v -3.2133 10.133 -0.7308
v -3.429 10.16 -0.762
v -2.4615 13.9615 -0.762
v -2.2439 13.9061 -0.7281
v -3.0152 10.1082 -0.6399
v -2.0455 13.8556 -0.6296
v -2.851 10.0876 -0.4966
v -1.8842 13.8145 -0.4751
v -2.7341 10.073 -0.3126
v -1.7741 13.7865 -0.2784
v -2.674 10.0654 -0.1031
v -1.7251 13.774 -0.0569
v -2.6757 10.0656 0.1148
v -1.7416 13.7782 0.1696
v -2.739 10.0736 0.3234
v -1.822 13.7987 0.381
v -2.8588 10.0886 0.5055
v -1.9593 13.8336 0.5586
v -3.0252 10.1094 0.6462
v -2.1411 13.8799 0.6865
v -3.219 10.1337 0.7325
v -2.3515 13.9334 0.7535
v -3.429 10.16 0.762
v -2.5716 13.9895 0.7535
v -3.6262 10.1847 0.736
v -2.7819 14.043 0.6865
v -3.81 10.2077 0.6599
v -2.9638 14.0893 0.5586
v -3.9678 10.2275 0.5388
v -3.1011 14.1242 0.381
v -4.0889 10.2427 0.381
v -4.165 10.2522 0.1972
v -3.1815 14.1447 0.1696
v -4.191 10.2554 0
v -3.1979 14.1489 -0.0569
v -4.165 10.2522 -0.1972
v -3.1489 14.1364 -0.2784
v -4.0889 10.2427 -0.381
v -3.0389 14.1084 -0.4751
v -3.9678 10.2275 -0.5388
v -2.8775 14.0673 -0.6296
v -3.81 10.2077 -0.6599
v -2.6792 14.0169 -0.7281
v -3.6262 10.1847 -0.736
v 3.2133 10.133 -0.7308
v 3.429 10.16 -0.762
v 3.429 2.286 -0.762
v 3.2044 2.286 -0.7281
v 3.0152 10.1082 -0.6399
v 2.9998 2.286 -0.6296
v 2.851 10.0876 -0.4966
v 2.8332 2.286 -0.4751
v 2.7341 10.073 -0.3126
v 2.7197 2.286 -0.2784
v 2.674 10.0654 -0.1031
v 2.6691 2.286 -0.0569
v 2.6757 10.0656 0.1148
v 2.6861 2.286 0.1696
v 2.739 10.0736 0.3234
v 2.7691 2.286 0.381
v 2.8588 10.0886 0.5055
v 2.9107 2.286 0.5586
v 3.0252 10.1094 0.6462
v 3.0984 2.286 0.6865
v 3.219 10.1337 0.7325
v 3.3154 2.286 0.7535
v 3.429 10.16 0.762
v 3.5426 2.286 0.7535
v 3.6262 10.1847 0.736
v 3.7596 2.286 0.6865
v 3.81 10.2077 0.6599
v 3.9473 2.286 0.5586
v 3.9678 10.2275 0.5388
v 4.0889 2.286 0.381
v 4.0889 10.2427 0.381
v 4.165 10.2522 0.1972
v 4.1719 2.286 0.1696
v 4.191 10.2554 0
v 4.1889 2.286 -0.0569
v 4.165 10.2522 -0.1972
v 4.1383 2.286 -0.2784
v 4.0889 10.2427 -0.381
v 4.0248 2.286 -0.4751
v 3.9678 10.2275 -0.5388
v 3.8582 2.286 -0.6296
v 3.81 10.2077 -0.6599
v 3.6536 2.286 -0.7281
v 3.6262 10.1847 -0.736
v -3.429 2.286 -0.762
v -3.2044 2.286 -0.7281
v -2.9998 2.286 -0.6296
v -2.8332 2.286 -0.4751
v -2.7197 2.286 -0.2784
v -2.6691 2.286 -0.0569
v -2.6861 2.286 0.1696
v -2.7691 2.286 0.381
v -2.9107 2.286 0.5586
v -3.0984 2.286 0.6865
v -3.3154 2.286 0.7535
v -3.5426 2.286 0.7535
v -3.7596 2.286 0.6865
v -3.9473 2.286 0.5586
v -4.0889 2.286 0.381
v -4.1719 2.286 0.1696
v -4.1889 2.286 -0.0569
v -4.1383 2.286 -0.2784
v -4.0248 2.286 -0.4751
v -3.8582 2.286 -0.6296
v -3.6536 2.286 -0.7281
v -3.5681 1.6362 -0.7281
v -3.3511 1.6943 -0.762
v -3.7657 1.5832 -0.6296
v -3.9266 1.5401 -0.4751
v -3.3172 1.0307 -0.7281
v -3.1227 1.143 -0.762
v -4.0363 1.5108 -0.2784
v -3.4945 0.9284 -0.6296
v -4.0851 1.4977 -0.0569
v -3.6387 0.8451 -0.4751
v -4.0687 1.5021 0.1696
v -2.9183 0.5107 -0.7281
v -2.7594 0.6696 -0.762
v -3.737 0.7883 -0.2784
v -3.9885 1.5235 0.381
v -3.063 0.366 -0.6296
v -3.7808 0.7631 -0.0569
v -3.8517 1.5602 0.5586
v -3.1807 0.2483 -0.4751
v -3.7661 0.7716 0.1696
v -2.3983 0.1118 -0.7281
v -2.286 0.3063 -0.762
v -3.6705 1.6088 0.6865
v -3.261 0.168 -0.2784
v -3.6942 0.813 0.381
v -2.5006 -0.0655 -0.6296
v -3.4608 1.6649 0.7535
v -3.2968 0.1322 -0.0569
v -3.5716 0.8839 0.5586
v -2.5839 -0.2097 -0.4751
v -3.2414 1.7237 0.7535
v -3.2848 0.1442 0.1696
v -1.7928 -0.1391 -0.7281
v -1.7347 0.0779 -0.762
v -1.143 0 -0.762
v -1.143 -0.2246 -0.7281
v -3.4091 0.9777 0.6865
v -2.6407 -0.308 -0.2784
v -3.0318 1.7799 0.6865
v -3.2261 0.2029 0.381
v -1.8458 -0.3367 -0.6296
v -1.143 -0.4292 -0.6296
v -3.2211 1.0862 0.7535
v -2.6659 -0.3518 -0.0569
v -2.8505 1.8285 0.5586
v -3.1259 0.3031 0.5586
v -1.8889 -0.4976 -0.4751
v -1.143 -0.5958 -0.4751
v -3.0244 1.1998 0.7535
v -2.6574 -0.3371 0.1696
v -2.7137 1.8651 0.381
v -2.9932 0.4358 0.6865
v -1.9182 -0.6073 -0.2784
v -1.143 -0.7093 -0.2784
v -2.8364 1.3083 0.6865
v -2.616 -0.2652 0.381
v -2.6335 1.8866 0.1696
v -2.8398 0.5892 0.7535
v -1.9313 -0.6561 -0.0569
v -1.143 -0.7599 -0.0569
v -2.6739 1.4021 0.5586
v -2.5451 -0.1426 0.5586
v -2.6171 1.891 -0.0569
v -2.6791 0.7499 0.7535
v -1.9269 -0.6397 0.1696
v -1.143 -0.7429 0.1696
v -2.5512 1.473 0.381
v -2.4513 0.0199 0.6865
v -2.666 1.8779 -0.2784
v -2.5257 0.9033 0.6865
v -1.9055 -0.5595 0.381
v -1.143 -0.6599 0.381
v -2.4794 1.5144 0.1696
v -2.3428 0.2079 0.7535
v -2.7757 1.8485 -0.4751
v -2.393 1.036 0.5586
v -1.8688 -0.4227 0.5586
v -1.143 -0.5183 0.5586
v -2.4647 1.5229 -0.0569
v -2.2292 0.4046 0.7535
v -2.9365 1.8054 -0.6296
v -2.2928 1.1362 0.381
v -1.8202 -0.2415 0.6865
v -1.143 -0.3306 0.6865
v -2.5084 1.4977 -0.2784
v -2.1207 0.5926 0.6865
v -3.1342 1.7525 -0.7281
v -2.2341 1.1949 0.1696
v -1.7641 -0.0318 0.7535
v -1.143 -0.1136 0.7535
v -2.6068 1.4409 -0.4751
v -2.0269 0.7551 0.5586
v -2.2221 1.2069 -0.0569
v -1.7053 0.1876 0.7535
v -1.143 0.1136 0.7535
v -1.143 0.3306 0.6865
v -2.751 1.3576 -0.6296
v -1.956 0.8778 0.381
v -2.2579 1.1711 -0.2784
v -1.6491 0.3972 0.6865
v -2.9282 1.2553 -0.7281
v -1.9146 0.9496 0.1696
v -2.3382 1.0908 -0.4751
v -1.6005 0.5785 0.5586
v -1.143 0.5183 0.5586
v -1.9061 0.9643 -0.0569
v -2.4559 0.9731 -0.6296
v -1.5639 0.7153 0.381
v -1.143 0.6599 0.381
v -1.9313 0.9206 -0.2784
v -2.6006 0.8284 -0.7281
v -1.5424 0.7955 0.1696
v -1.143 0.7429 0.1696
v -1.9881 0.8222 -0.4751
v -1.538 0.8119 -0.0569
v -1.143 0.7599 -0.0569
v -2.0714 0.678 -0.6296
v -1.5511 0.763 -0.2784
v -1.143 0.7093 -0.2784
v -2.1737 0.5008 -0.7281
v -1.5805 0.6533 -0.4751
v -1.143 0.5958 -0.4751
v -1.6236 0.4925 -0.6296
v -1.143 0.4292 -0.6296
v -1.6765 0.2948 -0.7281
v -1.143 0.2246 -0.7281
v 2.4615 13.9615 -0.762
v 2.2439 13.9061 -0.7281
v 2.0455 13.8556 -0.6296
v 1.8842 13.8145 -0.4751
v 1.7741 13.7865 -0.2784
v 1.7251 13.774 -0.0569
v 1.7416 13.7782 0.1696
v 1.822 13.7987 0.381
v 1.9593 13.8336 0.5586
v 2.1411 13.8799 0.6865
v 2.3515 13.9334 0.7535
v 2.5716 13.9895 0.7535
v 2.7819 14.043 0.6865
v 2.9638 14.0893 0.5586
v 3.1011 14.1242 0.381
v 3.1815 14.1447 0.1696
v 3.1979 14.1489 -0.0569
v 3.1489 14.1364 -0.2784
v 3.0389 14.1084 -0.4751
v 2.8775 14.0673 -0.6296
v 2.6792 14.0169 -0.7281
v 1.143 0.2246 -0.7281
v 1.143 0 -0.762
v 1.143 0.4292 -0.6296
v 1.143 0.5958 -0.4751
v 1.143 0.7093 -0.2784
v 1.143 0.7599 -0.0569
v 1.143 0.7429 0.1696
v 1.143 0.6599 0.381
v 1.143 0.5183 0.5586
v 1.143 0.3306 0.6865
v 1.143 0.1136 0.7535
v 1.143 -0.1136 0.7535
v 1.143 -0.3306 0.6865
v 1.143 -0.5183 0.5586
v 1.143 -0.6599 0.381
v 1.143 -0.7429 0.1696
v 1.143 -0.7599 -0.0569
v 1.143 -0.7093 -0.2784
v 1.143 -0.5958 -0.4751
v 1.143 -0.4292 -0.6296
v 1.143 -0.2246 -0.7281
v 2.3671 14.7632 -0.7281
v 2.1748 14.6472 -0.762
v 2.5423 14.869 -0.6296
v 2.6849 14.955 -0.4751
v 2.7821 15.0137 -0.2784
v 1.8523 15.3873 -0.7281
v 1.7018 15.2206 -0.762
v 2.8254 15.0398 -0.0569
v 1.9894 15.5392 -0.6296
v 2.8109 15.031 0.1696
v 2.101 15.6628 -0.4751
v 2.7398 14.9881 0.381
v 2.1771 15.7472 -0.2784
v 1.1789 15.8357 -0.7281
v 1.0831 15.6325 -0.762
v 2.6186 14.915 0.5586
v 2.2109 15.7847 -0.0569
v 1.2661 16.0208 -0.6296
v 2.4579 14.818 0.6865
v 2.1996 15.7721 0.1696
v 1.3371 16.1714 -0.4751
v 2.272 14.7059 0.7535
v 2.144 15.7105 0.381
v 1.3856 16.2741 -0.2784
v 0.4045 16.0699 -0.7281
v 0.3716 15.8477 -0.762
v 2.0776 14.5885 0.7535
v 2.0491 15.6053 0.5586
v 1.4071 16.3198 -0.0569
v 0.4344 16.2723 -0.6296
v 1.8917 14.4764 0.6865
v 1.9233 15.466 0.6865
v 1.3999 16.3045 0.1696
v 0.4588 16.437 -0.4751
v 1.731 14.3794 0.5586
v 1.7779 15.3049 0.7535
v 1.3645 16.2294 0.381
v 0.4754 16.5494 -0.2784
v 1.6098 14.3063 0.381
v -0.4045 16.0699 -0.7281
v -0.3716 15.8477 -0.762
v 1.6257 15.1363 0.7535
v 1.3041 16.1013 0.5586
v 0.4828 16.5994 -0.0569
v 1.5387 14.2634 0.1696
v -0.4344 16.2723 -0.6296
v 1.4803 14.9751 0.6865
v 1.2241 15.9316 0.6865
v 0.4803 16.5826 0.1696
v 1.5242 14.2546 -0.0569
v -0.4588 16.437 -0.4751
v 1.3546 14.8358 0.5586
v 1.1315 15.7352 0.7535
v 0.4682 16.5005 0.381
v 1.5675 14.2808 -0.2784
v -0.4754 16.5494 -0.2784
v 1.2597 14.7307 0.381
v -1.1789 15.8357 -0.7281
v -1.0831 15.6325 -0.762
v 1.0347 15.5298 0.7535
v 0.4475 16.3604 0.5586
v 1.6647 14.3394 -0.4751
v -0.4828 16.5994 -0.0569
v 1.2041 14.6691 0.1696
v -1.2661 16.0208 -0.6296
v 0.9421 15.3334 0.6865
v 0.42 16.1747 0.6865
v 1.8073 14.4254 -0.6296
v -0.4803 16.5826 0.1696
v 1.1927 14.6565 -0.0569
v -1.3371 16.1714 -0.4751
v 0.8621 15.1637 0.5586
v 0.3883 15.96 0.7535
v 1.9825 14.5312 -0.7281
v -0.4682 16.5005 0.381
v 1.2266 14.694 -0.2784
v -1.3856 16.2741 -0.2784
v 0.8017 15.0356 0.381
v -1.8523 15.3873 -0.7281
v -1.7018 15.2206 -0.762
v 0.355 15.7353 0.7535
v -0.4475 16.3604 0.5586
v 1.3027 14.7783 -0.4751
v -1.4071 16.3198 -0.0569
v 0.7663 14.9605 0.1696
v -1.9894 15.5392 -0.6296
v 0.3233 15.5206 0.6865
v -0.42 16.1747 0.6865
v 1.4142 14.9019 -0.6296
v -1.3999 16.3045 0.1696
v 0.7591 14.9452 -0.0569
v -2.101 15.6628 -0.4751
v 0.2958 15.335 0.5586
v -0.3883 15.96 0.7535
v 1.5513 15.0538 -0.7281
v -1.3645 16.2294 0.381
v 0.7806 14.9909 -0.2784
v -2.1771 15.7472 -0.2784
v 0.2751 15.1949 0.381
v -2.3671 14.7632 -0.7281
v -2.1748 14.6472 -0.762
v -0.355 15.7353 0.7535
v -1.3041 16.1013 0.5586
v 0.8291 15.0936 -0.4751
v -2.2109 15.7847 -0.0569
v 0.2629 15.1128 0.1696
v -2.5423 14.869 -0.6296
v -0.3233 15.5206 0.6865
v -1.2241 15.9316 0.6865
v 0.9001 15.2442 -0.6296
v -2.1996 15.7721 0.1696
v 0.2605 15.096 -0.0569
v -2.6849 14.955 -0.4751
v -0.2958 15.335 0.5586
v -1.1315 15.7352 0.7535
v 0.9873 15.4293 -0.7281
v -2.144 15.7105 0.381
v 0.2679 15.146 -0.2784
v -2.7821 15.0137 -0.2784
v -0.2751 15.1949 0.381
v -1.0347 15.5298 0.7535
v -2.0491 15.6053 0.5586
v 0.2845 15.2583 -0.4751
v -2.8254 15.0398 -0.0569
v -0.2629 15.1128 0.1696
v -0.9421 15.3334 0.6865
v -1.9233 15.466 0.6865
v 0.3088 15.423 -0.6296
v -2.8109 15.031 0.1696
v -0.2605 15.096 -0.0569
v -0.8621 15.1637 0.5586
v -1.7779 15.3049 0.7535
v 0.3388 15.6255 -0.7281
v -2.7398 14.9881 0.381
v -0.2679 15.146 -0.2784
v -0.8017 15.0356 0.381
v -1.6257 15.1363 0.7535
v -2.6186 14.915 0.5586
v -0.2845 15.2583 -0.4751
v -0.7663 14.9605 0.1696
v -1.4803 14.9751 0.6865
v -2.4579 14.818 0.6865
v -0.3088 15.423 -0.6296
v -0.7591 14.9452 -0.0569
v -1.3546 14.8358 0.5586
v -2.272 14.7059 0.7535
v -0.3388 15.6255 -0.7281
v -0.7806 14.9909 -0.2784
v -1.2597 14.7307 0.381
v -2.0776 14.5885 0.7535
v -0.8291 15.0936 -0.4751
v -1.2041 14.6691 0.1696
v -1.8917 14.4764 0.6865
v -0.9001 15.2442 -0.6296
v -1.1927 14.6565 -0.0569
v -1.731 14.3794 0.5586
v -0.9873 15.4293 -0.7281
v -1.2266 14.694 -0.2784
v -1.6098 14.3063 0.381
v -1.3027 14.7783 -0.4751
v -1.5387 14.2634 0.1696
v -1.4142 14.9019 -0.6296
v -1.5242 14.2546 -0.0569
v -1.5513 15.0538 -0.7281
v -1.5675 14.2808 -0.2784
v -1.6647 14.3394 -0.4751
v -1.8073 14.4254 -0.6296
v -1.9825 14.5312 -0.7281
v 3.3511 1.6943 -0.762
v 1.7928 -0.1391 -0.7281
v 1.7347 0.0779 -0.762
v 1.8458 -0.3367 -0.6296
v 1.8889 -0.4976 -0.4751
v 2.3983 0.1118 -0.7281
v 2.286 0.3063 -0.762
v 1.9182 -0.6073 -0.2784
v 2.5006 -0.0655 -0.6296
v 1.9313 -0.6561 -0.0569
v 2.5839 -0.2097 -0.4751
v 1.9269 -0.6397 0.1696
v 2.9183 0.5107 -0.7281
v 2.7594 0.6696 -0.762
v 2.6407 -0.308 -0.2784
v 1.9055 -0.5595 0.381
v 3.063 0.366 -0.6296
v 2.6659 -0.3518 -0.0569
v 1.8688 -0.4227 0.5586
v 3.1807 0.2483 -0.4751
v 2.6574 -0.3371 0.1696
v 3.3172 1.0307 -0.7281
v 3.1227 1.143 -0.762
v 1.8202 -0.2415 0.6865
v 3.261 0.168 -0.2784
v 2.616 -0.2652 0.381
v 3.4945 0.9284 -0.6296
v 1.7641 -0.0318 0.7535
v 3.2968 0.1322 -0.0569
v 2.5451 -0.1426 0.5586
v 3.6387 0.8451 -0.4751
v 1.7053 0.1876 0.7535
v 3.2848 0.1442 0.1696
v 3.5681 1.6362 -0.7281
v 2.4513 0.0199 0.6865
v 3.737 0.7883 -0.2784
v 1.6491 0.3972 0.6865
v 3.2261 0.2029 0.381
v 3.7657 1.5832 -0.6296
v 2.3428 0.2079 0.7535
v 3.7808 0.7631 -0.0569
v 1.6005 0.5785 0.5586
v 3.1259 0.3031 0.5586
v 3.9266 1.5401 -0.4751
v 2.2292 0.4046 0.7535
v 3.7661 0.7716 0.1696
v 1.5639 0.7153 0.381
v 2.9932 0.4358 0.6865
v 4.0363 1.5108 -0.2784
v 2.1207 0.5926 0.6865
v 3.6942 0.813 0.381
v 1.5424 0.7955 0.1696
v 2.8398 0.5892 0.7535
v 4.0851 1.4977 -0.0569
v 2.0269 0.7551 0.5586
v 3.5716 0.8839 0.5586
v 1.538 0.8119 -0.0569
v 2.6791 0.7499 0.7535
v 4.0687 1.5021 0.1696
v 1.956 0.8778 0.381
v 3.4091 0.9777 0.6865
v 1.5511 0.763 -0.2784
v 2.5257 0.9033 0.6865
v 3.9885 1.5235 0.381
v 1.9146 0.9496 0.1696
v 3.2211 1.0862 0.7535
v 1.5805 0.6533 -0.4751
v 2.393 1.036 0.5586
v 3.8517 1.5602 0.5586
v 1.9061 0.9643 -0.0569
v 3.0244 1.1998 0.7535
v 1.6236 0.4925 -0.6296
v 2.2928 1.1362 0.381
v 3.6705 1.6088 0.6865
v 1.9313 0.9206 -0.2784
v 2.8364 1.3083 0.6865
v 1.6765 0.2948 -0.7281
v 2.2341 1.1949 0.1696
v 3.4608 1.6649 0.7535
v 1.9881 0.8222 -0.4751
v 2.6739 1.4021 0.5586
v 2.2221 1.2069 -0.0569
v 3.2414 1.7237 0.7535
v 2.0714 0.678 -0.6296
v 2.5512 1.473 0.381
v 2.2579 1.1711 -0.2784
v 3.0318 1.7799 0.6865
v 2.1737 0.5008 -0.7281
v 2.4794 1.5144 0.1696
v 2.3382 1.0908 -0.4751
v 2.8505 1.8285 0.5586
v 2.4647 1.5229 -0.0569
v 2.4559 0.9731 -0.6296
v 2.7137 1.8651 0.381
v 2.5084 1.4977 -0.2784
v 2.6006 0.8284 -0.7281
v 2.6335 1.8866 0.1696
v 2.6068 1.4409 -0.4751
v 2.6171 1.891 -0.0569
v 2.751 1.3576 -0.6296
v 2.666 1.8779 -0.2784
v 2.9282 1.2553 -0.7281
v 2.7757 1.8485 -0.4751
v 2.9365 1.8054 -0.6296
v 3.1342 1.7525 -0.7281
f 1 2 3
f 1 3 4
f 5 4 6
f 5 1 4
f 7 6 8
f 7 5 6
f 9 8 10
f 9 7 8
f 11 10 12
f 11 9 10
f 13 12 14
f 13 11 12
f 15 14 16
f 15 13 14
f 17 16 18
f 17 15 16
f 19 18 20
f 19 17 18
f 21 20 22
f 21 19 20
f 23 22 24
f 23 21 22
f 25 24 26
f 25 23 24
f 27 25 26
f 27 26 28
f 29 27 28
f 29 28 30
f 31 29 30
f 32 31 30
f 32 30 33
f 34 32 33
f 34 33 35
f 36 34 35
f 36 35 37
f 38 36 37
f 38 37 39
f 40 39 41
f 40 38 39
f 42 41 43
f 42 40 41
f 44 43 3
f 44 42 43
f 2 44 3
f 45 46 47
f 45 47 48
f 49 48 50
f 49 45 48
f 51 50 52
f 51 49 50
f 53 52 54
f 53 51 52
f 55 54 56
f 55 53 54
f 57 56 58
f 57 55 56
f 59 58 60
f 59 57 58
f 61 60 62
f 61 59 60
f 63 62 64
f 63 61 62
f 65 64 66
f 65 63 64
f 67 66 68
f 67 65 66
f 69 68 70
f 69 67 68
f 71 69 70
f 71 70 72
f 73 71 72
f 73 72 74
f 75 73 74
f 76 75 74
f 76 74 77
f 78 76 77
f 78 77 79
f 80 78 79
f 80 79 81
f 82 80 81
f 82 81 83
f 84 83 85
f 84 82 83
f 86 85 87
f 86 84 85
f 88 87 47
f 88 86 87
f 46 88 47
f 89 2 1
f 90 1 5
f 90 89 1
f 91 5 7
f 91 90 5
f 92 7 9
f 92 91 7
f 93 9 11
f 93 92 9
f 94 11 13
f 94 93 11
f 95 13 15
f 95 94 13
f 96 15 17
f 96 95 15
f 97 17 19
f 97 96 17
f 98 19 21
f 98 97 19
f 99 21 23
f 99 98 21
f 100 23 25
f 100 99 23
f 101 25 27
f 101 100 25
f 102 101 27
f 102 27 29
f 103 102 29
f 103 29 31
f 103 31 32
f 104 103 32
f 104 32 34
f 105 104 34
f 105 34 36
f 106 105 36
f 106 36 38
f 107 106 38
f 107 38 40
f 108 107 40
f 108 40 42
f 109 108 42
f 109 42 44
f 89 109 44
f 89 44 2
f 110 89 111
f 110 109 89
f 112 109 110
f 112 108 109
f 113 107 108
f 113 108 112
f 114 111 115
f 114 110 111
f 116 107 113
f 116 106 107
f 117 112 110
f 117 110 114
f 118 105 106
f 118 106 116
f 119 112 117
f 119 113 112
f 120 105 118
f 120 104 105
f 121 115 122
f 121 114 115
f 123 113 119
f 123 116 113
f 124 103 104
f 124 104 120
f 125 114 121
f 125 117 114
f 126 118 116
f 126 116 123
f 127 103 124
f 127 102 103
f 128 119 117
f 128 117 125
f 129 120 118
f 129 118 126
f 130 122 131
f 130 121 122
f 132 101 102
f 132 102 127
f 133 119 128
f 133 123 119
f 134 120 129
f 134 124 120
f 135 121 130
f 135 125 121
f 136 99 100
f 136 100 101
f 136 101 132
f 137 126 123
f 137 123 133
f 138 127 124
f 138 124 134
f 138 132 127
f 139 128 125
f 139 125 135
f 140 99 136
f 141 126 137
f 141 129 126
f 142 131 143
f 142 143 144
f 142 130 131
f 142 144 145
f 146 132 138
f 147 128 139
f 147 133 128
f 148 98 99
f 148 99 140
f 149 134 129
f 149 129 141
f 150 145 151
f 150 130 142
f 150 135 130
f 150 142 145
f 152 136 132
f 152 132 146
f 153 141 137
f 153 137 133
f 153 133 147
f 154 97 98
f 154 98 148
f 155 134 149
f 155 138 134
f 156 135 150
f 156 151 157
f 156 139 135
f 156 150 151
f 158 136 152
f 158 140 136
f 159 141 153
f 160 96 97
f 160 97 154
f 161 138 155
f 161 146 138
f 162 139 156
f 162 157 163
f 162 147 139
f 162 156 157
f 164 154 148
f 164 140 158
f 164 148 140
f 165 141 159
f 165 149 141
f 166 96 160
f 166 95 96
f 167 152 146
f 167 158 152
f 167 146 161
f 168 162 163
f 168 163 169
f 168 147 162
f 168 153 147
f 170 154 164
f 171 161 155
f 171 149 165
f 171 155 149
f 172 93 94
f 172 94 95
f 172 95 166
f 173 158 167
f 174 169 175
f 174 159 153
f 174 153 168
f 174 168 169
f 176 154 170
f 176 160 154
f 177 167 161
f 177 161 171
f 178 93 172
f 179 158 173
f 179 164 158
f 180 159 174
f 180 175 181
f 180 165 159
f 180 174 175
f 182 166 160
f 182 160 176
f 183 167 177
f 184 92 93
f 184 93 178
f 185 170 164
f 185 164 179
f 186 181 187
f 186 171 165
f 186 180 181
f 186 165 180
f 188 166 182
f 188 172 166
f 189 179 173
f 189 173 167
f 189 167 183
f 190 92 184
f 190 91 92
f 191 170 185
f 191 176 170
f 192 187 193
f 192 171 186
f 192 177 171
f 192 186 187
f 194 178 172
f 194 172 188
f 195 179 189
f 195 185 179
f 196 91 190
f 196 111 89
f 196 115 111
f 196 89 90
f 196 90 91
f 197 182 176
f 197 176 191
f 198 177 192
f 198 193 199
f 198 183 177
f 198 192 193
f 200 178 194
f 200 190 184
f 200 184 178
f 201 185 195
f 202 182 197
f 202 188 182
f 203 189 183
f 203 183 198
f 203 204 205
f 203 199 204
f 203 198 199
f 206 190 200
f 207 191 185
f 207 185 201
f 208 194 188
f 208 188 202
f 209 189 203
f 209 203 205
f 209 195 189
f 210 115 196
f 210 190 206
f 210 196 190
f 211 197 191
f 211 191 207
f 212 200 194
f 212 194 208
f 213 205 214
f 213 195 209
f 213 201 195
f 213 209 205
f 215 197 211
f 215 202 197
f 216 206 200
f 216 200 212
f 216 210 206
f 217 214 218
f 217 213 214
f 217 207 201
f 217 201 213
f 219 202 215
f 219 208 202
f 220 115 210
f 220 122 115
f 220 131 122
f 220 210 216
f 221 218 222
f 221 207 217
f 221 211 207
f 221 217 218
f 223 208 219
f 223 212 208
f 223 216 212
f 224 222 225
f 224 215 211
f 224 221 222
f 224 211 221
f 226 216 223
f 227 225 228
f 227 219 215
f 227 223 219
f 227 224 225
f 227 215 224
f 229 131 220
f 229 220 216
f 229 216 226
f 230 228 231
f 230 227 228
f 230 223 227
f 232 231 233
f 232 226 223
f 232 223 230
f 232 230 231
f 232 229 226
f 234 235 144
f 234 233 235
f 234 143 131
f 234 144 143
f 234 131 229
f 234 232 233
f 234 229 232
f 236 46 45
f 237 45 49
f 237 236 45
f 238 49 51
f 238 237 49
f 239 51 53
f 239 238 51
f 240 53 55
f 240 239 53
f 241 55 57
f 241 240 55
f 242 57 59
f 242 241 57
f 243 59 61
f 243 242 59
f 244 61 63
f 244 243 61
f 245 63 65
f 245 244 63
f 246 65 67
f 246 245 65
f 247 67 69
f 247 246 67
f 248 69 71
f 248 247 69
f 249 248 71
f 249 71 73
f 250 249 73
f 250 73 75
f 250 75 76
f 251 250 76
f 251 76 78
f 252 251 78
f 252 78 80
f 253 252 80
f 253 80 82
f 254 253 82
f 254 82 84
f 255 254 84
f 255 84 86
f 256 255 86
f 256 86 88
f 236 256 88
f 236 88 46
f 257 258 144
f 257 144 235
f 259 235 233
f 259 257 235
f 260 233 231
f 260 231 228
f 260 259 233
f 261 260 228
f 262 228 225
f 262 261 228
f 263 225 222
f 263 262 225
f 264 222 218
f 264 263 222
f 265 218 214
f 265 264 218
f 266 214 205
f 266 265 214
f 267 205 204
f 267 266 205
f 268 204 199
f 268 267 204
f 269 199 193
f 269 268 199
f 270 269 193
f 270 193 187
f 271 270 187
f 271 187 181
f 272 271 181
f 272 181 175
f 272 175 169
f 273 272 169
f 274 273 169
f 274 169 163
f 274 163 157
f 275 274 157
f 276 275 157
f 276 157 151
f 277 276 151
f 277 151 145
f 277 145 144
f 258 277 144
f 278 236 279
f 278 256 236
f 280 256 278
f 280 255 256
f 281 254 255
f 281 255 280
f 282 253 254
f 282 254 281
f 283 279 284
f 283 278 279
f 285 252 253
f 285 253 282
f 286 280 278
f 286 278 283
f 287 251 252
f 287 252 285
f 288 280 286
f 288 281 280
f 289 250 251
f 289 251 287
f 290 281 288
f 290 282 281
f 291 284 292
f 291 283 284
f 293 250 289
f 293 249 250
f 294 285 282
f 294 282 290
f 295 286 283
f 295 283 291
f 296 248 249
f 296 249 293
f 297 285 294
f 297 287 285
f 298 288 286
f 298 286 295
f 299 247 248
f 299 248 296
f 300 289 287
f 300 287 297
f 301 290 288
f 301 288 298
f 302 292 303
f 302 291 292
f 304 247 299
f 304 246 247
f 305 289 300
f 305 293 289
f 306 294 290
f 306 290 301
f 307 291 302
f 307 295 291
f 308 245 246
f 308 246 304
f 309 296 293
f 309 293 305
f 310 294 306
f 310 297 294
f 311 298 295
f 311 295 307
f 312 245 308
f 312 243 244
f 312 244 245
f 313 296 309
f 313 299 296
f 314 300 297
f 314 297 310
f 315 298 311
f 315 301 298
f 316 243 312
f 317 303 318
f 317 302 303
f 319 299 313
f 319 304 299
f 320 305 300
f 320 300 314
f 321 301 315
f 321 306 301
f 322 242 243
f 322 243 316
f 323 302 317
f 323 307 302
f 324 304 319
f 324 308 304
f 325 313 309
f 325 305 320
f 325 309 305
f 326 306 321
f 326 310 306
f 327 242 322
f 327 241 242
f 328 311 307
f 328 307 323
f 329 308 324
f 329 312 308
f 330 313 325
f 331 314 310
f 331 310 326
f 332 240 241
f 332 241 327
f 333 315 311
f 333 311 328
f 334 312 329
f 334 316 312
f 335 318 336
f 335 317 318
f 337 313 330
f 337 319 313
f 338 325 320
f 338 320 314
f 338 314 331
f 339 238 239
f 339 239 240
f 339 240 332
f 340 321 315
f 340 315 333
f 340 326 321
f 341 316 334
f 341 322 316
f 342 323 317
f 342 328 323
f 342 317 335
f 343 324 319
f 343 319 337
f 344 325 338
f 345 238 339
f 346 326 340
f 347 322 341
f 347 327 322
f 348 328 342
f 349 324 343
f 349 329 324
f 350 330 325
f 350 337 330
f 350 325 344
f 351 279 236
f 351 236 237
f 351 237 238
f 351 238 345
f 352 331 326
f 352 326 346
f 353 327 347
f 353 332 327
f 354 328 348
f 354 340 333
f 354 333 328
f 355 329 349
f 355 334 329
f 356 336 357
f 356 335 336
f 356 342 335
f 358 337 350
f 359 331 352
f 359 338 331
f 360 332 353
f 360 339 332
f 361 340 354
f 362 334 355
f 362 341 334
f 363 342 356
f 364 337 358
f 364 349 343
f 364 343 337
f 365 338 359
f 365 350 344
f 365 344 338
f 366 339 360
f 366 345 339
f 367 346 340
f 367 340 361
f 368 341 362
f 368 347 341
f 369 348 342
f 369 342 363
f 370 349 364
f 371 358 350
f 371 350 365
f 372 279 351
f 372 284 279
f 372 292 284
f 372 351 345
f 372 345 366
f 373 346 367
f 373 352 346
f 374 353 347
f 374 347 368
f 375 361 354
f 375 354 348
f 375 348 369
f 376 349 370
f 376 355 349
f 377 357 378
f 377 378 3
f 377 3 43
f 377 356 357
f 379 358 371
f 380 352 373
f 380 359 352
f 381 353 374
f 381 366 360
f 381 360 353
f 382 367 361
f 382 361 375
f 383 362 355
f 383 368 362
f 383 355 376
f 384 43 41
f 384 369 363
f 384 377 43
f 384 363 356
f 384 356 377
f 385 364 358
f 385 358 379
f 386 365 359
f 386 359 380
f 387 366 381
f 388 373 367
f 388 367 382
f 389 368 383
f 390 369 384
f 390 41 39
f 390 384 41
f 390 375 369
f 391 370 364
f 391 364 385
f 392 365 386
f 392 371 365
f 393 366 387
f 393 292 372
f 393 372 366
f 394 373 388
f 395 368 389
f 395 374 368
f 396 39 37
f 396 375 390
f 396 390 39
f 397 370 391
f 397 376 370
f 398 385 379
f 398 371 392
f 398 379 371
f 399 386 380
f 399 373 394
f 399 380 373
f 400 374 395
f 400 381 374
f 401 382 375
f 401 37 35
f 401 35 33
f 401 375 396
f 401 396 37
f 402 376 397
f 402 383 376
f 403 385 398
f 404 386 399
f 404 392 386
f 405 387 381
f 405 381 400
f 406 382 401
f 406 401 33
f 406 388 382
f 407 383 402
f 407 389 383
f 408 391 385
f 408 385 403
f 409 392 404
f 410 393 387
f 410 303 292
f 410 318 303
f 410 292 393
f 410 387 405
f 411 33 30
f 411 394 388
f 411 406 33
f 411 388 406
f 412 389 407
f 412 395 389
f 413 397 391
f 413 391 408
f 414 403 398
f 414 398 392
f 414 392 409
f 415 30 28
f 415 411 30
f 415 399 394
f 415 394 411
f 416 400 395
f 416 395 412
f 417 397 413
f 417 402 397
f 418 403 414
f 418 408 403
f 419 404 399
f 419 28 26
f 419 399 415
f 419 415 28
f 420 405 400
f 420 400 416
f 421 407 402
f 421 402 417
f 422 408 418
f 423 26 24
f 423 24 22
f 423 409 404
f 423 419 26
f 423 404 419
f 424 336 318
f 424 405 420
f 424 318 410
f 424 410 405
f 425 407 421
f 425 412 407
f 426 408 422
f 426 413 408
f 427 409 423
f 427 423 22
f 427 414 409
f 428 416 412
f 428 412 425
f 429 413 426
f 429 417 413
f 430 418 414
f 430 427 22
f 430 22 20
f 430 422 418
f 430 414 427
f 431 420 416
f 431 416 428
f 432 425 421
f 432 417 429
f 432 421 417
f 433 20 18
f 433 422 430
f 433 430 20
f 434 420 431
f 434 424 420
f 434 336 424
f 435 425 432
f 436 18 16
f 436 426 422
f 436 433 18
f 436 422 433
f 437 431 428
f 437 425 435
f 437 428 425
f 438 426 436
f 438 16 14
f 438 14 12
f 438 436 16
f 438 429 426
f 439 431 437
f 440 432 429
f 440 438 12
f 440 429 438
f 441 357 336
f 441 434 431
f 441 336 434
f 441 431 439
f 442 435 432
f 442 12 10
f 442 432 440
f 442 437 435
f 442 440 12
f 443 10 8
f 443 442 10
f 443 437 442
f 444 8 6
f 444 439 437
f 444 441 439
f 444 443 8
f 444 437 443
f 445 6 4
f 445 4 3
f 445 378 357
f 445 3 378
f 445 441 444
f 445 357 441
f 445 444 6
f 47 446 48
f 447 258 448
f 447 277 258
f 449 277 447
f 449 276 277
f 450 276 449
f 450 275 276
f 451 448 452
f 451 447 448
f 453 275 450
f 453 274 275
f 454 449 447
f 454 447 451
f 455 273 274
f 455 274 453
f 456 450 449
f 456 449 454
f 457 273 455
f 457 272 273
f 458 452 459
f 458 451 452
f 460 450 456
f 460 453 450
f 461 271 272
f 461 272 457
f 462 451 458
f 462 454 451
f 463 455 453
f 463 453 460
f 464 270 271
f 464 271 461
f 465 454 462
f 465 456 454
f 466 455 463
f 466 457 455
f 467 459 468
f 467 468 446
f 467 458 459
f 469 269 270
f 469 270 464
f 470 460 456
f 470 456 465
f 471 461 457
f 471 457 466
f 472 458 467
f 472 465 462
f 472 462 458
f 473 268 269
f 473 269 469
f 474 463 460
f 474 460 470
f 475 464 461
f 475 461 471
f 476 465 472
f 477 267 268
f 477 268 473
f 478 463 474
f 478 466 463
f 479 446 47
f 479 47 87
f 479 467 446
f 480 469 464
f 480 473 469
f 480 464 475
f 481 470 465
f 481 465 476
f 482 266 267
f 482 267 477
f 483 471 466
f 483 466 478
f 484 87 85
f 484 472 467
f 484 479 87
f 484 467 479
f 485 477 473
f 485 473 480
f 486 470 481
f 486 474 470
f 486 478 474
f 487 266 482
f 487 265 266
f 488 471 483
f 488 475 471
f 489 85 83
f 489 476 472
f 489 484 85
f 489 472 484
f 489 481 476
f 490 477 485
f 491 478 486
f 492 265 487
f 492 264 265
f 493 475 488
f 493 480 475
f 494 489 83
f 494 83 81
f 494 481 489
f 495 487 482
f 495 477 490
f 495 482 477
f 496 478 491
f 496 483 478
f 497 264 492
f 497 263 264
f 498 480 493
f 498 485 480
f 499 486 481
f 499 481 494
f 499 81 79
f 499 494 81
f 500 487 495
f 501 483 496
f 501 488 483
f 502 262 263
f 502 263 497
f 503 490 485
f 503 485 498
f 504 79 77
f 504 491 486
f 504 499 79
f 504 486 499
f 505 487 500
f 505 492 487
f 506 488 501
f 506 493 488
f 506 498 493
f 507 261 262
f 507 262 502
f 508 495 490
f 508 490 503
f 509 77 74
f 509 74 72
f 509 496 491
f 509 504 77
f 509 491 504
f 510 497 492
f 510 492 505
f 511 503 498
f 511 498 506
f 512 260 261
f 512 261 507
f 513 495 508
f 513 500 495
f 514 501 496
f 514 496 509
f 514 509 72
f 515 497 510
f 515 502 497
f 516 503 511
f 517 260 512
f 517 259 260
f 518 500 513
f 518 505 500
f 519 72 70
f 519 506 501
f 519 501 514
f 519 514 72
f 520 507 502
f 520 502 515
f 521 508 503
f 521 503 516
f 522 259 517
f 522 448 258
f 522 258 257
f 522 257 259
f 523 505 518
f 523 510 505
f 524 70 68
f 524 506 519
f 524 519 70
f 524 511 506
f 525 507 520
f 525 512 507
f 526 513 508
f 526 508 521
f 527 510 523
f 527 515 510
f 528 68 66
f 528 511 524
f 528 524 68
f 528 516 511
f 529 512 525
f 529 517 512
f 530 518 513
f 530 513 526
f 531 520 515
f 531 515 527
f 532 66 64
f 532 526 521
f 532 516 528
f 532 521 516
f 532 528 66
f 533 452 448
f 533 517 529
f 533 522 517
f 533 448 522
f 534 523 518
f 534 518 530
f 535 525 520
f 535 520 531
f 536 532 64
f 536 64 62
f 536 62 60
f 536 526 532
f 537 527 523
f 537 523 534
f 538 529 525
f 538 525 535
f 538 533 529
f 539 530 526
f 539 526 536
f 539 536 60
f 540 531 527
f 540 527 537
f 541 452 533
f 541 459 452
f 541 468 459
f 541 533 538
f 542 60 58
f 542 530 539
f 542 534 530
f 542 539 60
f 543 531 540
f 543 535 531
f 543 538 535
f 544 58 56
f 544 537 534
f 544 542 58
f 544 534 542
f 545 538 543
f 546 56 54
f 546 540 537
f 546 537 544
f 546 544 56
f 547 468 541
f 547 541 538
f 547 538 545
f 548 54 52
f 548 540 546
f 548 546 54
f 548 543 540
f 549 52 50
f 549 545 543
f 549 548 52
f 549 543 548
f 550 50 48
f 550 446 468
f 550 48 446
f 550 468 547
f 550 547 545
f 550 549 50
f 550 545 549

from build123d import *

# Parameters (mm, degrees)
SKETCH2_R = 0.762


with BuildPart() as part:
    # Base-Sweep: sweep along a path in Sketch1
    with BuildLine(Plane.XY) as base_sweep_path:
        Line((-1.143, 0), (1.143, 0))
        ThreePointArc((1.143, 0), (2.759446102, 0.669553898), (3.429, 2.286))
        Line((3.429, 2.286), (3.429, 10.16))
        Line((3.429, 10.16), (2.461534374, 13.961457123))
        ThreePointArc((2.461534374, 13.961457123), (0, 15.875), (-2.461534374, 13.961457123))
        Line((-2.461534374, 13.961457123), (-3.429, 10.16))
        Line((-3.429, 10.16), (-3.429, 2.286))
        ThreePointArc((-3.429, 2.286), (-2.759446102, 0.669553898), (-1.143, 0))
    # Sketch2 → Base-Sweep (sweep)
    with BuildSketch(Plane(origin=(0, 0, 0), x_dir=(0, 0, -1), z_dir=(1, 0, 0))):
        Circle(SKETCH2_R)
    sweep(path=base_sweep_path.line, transition=Transition.RIGHT)


solid = part.part
